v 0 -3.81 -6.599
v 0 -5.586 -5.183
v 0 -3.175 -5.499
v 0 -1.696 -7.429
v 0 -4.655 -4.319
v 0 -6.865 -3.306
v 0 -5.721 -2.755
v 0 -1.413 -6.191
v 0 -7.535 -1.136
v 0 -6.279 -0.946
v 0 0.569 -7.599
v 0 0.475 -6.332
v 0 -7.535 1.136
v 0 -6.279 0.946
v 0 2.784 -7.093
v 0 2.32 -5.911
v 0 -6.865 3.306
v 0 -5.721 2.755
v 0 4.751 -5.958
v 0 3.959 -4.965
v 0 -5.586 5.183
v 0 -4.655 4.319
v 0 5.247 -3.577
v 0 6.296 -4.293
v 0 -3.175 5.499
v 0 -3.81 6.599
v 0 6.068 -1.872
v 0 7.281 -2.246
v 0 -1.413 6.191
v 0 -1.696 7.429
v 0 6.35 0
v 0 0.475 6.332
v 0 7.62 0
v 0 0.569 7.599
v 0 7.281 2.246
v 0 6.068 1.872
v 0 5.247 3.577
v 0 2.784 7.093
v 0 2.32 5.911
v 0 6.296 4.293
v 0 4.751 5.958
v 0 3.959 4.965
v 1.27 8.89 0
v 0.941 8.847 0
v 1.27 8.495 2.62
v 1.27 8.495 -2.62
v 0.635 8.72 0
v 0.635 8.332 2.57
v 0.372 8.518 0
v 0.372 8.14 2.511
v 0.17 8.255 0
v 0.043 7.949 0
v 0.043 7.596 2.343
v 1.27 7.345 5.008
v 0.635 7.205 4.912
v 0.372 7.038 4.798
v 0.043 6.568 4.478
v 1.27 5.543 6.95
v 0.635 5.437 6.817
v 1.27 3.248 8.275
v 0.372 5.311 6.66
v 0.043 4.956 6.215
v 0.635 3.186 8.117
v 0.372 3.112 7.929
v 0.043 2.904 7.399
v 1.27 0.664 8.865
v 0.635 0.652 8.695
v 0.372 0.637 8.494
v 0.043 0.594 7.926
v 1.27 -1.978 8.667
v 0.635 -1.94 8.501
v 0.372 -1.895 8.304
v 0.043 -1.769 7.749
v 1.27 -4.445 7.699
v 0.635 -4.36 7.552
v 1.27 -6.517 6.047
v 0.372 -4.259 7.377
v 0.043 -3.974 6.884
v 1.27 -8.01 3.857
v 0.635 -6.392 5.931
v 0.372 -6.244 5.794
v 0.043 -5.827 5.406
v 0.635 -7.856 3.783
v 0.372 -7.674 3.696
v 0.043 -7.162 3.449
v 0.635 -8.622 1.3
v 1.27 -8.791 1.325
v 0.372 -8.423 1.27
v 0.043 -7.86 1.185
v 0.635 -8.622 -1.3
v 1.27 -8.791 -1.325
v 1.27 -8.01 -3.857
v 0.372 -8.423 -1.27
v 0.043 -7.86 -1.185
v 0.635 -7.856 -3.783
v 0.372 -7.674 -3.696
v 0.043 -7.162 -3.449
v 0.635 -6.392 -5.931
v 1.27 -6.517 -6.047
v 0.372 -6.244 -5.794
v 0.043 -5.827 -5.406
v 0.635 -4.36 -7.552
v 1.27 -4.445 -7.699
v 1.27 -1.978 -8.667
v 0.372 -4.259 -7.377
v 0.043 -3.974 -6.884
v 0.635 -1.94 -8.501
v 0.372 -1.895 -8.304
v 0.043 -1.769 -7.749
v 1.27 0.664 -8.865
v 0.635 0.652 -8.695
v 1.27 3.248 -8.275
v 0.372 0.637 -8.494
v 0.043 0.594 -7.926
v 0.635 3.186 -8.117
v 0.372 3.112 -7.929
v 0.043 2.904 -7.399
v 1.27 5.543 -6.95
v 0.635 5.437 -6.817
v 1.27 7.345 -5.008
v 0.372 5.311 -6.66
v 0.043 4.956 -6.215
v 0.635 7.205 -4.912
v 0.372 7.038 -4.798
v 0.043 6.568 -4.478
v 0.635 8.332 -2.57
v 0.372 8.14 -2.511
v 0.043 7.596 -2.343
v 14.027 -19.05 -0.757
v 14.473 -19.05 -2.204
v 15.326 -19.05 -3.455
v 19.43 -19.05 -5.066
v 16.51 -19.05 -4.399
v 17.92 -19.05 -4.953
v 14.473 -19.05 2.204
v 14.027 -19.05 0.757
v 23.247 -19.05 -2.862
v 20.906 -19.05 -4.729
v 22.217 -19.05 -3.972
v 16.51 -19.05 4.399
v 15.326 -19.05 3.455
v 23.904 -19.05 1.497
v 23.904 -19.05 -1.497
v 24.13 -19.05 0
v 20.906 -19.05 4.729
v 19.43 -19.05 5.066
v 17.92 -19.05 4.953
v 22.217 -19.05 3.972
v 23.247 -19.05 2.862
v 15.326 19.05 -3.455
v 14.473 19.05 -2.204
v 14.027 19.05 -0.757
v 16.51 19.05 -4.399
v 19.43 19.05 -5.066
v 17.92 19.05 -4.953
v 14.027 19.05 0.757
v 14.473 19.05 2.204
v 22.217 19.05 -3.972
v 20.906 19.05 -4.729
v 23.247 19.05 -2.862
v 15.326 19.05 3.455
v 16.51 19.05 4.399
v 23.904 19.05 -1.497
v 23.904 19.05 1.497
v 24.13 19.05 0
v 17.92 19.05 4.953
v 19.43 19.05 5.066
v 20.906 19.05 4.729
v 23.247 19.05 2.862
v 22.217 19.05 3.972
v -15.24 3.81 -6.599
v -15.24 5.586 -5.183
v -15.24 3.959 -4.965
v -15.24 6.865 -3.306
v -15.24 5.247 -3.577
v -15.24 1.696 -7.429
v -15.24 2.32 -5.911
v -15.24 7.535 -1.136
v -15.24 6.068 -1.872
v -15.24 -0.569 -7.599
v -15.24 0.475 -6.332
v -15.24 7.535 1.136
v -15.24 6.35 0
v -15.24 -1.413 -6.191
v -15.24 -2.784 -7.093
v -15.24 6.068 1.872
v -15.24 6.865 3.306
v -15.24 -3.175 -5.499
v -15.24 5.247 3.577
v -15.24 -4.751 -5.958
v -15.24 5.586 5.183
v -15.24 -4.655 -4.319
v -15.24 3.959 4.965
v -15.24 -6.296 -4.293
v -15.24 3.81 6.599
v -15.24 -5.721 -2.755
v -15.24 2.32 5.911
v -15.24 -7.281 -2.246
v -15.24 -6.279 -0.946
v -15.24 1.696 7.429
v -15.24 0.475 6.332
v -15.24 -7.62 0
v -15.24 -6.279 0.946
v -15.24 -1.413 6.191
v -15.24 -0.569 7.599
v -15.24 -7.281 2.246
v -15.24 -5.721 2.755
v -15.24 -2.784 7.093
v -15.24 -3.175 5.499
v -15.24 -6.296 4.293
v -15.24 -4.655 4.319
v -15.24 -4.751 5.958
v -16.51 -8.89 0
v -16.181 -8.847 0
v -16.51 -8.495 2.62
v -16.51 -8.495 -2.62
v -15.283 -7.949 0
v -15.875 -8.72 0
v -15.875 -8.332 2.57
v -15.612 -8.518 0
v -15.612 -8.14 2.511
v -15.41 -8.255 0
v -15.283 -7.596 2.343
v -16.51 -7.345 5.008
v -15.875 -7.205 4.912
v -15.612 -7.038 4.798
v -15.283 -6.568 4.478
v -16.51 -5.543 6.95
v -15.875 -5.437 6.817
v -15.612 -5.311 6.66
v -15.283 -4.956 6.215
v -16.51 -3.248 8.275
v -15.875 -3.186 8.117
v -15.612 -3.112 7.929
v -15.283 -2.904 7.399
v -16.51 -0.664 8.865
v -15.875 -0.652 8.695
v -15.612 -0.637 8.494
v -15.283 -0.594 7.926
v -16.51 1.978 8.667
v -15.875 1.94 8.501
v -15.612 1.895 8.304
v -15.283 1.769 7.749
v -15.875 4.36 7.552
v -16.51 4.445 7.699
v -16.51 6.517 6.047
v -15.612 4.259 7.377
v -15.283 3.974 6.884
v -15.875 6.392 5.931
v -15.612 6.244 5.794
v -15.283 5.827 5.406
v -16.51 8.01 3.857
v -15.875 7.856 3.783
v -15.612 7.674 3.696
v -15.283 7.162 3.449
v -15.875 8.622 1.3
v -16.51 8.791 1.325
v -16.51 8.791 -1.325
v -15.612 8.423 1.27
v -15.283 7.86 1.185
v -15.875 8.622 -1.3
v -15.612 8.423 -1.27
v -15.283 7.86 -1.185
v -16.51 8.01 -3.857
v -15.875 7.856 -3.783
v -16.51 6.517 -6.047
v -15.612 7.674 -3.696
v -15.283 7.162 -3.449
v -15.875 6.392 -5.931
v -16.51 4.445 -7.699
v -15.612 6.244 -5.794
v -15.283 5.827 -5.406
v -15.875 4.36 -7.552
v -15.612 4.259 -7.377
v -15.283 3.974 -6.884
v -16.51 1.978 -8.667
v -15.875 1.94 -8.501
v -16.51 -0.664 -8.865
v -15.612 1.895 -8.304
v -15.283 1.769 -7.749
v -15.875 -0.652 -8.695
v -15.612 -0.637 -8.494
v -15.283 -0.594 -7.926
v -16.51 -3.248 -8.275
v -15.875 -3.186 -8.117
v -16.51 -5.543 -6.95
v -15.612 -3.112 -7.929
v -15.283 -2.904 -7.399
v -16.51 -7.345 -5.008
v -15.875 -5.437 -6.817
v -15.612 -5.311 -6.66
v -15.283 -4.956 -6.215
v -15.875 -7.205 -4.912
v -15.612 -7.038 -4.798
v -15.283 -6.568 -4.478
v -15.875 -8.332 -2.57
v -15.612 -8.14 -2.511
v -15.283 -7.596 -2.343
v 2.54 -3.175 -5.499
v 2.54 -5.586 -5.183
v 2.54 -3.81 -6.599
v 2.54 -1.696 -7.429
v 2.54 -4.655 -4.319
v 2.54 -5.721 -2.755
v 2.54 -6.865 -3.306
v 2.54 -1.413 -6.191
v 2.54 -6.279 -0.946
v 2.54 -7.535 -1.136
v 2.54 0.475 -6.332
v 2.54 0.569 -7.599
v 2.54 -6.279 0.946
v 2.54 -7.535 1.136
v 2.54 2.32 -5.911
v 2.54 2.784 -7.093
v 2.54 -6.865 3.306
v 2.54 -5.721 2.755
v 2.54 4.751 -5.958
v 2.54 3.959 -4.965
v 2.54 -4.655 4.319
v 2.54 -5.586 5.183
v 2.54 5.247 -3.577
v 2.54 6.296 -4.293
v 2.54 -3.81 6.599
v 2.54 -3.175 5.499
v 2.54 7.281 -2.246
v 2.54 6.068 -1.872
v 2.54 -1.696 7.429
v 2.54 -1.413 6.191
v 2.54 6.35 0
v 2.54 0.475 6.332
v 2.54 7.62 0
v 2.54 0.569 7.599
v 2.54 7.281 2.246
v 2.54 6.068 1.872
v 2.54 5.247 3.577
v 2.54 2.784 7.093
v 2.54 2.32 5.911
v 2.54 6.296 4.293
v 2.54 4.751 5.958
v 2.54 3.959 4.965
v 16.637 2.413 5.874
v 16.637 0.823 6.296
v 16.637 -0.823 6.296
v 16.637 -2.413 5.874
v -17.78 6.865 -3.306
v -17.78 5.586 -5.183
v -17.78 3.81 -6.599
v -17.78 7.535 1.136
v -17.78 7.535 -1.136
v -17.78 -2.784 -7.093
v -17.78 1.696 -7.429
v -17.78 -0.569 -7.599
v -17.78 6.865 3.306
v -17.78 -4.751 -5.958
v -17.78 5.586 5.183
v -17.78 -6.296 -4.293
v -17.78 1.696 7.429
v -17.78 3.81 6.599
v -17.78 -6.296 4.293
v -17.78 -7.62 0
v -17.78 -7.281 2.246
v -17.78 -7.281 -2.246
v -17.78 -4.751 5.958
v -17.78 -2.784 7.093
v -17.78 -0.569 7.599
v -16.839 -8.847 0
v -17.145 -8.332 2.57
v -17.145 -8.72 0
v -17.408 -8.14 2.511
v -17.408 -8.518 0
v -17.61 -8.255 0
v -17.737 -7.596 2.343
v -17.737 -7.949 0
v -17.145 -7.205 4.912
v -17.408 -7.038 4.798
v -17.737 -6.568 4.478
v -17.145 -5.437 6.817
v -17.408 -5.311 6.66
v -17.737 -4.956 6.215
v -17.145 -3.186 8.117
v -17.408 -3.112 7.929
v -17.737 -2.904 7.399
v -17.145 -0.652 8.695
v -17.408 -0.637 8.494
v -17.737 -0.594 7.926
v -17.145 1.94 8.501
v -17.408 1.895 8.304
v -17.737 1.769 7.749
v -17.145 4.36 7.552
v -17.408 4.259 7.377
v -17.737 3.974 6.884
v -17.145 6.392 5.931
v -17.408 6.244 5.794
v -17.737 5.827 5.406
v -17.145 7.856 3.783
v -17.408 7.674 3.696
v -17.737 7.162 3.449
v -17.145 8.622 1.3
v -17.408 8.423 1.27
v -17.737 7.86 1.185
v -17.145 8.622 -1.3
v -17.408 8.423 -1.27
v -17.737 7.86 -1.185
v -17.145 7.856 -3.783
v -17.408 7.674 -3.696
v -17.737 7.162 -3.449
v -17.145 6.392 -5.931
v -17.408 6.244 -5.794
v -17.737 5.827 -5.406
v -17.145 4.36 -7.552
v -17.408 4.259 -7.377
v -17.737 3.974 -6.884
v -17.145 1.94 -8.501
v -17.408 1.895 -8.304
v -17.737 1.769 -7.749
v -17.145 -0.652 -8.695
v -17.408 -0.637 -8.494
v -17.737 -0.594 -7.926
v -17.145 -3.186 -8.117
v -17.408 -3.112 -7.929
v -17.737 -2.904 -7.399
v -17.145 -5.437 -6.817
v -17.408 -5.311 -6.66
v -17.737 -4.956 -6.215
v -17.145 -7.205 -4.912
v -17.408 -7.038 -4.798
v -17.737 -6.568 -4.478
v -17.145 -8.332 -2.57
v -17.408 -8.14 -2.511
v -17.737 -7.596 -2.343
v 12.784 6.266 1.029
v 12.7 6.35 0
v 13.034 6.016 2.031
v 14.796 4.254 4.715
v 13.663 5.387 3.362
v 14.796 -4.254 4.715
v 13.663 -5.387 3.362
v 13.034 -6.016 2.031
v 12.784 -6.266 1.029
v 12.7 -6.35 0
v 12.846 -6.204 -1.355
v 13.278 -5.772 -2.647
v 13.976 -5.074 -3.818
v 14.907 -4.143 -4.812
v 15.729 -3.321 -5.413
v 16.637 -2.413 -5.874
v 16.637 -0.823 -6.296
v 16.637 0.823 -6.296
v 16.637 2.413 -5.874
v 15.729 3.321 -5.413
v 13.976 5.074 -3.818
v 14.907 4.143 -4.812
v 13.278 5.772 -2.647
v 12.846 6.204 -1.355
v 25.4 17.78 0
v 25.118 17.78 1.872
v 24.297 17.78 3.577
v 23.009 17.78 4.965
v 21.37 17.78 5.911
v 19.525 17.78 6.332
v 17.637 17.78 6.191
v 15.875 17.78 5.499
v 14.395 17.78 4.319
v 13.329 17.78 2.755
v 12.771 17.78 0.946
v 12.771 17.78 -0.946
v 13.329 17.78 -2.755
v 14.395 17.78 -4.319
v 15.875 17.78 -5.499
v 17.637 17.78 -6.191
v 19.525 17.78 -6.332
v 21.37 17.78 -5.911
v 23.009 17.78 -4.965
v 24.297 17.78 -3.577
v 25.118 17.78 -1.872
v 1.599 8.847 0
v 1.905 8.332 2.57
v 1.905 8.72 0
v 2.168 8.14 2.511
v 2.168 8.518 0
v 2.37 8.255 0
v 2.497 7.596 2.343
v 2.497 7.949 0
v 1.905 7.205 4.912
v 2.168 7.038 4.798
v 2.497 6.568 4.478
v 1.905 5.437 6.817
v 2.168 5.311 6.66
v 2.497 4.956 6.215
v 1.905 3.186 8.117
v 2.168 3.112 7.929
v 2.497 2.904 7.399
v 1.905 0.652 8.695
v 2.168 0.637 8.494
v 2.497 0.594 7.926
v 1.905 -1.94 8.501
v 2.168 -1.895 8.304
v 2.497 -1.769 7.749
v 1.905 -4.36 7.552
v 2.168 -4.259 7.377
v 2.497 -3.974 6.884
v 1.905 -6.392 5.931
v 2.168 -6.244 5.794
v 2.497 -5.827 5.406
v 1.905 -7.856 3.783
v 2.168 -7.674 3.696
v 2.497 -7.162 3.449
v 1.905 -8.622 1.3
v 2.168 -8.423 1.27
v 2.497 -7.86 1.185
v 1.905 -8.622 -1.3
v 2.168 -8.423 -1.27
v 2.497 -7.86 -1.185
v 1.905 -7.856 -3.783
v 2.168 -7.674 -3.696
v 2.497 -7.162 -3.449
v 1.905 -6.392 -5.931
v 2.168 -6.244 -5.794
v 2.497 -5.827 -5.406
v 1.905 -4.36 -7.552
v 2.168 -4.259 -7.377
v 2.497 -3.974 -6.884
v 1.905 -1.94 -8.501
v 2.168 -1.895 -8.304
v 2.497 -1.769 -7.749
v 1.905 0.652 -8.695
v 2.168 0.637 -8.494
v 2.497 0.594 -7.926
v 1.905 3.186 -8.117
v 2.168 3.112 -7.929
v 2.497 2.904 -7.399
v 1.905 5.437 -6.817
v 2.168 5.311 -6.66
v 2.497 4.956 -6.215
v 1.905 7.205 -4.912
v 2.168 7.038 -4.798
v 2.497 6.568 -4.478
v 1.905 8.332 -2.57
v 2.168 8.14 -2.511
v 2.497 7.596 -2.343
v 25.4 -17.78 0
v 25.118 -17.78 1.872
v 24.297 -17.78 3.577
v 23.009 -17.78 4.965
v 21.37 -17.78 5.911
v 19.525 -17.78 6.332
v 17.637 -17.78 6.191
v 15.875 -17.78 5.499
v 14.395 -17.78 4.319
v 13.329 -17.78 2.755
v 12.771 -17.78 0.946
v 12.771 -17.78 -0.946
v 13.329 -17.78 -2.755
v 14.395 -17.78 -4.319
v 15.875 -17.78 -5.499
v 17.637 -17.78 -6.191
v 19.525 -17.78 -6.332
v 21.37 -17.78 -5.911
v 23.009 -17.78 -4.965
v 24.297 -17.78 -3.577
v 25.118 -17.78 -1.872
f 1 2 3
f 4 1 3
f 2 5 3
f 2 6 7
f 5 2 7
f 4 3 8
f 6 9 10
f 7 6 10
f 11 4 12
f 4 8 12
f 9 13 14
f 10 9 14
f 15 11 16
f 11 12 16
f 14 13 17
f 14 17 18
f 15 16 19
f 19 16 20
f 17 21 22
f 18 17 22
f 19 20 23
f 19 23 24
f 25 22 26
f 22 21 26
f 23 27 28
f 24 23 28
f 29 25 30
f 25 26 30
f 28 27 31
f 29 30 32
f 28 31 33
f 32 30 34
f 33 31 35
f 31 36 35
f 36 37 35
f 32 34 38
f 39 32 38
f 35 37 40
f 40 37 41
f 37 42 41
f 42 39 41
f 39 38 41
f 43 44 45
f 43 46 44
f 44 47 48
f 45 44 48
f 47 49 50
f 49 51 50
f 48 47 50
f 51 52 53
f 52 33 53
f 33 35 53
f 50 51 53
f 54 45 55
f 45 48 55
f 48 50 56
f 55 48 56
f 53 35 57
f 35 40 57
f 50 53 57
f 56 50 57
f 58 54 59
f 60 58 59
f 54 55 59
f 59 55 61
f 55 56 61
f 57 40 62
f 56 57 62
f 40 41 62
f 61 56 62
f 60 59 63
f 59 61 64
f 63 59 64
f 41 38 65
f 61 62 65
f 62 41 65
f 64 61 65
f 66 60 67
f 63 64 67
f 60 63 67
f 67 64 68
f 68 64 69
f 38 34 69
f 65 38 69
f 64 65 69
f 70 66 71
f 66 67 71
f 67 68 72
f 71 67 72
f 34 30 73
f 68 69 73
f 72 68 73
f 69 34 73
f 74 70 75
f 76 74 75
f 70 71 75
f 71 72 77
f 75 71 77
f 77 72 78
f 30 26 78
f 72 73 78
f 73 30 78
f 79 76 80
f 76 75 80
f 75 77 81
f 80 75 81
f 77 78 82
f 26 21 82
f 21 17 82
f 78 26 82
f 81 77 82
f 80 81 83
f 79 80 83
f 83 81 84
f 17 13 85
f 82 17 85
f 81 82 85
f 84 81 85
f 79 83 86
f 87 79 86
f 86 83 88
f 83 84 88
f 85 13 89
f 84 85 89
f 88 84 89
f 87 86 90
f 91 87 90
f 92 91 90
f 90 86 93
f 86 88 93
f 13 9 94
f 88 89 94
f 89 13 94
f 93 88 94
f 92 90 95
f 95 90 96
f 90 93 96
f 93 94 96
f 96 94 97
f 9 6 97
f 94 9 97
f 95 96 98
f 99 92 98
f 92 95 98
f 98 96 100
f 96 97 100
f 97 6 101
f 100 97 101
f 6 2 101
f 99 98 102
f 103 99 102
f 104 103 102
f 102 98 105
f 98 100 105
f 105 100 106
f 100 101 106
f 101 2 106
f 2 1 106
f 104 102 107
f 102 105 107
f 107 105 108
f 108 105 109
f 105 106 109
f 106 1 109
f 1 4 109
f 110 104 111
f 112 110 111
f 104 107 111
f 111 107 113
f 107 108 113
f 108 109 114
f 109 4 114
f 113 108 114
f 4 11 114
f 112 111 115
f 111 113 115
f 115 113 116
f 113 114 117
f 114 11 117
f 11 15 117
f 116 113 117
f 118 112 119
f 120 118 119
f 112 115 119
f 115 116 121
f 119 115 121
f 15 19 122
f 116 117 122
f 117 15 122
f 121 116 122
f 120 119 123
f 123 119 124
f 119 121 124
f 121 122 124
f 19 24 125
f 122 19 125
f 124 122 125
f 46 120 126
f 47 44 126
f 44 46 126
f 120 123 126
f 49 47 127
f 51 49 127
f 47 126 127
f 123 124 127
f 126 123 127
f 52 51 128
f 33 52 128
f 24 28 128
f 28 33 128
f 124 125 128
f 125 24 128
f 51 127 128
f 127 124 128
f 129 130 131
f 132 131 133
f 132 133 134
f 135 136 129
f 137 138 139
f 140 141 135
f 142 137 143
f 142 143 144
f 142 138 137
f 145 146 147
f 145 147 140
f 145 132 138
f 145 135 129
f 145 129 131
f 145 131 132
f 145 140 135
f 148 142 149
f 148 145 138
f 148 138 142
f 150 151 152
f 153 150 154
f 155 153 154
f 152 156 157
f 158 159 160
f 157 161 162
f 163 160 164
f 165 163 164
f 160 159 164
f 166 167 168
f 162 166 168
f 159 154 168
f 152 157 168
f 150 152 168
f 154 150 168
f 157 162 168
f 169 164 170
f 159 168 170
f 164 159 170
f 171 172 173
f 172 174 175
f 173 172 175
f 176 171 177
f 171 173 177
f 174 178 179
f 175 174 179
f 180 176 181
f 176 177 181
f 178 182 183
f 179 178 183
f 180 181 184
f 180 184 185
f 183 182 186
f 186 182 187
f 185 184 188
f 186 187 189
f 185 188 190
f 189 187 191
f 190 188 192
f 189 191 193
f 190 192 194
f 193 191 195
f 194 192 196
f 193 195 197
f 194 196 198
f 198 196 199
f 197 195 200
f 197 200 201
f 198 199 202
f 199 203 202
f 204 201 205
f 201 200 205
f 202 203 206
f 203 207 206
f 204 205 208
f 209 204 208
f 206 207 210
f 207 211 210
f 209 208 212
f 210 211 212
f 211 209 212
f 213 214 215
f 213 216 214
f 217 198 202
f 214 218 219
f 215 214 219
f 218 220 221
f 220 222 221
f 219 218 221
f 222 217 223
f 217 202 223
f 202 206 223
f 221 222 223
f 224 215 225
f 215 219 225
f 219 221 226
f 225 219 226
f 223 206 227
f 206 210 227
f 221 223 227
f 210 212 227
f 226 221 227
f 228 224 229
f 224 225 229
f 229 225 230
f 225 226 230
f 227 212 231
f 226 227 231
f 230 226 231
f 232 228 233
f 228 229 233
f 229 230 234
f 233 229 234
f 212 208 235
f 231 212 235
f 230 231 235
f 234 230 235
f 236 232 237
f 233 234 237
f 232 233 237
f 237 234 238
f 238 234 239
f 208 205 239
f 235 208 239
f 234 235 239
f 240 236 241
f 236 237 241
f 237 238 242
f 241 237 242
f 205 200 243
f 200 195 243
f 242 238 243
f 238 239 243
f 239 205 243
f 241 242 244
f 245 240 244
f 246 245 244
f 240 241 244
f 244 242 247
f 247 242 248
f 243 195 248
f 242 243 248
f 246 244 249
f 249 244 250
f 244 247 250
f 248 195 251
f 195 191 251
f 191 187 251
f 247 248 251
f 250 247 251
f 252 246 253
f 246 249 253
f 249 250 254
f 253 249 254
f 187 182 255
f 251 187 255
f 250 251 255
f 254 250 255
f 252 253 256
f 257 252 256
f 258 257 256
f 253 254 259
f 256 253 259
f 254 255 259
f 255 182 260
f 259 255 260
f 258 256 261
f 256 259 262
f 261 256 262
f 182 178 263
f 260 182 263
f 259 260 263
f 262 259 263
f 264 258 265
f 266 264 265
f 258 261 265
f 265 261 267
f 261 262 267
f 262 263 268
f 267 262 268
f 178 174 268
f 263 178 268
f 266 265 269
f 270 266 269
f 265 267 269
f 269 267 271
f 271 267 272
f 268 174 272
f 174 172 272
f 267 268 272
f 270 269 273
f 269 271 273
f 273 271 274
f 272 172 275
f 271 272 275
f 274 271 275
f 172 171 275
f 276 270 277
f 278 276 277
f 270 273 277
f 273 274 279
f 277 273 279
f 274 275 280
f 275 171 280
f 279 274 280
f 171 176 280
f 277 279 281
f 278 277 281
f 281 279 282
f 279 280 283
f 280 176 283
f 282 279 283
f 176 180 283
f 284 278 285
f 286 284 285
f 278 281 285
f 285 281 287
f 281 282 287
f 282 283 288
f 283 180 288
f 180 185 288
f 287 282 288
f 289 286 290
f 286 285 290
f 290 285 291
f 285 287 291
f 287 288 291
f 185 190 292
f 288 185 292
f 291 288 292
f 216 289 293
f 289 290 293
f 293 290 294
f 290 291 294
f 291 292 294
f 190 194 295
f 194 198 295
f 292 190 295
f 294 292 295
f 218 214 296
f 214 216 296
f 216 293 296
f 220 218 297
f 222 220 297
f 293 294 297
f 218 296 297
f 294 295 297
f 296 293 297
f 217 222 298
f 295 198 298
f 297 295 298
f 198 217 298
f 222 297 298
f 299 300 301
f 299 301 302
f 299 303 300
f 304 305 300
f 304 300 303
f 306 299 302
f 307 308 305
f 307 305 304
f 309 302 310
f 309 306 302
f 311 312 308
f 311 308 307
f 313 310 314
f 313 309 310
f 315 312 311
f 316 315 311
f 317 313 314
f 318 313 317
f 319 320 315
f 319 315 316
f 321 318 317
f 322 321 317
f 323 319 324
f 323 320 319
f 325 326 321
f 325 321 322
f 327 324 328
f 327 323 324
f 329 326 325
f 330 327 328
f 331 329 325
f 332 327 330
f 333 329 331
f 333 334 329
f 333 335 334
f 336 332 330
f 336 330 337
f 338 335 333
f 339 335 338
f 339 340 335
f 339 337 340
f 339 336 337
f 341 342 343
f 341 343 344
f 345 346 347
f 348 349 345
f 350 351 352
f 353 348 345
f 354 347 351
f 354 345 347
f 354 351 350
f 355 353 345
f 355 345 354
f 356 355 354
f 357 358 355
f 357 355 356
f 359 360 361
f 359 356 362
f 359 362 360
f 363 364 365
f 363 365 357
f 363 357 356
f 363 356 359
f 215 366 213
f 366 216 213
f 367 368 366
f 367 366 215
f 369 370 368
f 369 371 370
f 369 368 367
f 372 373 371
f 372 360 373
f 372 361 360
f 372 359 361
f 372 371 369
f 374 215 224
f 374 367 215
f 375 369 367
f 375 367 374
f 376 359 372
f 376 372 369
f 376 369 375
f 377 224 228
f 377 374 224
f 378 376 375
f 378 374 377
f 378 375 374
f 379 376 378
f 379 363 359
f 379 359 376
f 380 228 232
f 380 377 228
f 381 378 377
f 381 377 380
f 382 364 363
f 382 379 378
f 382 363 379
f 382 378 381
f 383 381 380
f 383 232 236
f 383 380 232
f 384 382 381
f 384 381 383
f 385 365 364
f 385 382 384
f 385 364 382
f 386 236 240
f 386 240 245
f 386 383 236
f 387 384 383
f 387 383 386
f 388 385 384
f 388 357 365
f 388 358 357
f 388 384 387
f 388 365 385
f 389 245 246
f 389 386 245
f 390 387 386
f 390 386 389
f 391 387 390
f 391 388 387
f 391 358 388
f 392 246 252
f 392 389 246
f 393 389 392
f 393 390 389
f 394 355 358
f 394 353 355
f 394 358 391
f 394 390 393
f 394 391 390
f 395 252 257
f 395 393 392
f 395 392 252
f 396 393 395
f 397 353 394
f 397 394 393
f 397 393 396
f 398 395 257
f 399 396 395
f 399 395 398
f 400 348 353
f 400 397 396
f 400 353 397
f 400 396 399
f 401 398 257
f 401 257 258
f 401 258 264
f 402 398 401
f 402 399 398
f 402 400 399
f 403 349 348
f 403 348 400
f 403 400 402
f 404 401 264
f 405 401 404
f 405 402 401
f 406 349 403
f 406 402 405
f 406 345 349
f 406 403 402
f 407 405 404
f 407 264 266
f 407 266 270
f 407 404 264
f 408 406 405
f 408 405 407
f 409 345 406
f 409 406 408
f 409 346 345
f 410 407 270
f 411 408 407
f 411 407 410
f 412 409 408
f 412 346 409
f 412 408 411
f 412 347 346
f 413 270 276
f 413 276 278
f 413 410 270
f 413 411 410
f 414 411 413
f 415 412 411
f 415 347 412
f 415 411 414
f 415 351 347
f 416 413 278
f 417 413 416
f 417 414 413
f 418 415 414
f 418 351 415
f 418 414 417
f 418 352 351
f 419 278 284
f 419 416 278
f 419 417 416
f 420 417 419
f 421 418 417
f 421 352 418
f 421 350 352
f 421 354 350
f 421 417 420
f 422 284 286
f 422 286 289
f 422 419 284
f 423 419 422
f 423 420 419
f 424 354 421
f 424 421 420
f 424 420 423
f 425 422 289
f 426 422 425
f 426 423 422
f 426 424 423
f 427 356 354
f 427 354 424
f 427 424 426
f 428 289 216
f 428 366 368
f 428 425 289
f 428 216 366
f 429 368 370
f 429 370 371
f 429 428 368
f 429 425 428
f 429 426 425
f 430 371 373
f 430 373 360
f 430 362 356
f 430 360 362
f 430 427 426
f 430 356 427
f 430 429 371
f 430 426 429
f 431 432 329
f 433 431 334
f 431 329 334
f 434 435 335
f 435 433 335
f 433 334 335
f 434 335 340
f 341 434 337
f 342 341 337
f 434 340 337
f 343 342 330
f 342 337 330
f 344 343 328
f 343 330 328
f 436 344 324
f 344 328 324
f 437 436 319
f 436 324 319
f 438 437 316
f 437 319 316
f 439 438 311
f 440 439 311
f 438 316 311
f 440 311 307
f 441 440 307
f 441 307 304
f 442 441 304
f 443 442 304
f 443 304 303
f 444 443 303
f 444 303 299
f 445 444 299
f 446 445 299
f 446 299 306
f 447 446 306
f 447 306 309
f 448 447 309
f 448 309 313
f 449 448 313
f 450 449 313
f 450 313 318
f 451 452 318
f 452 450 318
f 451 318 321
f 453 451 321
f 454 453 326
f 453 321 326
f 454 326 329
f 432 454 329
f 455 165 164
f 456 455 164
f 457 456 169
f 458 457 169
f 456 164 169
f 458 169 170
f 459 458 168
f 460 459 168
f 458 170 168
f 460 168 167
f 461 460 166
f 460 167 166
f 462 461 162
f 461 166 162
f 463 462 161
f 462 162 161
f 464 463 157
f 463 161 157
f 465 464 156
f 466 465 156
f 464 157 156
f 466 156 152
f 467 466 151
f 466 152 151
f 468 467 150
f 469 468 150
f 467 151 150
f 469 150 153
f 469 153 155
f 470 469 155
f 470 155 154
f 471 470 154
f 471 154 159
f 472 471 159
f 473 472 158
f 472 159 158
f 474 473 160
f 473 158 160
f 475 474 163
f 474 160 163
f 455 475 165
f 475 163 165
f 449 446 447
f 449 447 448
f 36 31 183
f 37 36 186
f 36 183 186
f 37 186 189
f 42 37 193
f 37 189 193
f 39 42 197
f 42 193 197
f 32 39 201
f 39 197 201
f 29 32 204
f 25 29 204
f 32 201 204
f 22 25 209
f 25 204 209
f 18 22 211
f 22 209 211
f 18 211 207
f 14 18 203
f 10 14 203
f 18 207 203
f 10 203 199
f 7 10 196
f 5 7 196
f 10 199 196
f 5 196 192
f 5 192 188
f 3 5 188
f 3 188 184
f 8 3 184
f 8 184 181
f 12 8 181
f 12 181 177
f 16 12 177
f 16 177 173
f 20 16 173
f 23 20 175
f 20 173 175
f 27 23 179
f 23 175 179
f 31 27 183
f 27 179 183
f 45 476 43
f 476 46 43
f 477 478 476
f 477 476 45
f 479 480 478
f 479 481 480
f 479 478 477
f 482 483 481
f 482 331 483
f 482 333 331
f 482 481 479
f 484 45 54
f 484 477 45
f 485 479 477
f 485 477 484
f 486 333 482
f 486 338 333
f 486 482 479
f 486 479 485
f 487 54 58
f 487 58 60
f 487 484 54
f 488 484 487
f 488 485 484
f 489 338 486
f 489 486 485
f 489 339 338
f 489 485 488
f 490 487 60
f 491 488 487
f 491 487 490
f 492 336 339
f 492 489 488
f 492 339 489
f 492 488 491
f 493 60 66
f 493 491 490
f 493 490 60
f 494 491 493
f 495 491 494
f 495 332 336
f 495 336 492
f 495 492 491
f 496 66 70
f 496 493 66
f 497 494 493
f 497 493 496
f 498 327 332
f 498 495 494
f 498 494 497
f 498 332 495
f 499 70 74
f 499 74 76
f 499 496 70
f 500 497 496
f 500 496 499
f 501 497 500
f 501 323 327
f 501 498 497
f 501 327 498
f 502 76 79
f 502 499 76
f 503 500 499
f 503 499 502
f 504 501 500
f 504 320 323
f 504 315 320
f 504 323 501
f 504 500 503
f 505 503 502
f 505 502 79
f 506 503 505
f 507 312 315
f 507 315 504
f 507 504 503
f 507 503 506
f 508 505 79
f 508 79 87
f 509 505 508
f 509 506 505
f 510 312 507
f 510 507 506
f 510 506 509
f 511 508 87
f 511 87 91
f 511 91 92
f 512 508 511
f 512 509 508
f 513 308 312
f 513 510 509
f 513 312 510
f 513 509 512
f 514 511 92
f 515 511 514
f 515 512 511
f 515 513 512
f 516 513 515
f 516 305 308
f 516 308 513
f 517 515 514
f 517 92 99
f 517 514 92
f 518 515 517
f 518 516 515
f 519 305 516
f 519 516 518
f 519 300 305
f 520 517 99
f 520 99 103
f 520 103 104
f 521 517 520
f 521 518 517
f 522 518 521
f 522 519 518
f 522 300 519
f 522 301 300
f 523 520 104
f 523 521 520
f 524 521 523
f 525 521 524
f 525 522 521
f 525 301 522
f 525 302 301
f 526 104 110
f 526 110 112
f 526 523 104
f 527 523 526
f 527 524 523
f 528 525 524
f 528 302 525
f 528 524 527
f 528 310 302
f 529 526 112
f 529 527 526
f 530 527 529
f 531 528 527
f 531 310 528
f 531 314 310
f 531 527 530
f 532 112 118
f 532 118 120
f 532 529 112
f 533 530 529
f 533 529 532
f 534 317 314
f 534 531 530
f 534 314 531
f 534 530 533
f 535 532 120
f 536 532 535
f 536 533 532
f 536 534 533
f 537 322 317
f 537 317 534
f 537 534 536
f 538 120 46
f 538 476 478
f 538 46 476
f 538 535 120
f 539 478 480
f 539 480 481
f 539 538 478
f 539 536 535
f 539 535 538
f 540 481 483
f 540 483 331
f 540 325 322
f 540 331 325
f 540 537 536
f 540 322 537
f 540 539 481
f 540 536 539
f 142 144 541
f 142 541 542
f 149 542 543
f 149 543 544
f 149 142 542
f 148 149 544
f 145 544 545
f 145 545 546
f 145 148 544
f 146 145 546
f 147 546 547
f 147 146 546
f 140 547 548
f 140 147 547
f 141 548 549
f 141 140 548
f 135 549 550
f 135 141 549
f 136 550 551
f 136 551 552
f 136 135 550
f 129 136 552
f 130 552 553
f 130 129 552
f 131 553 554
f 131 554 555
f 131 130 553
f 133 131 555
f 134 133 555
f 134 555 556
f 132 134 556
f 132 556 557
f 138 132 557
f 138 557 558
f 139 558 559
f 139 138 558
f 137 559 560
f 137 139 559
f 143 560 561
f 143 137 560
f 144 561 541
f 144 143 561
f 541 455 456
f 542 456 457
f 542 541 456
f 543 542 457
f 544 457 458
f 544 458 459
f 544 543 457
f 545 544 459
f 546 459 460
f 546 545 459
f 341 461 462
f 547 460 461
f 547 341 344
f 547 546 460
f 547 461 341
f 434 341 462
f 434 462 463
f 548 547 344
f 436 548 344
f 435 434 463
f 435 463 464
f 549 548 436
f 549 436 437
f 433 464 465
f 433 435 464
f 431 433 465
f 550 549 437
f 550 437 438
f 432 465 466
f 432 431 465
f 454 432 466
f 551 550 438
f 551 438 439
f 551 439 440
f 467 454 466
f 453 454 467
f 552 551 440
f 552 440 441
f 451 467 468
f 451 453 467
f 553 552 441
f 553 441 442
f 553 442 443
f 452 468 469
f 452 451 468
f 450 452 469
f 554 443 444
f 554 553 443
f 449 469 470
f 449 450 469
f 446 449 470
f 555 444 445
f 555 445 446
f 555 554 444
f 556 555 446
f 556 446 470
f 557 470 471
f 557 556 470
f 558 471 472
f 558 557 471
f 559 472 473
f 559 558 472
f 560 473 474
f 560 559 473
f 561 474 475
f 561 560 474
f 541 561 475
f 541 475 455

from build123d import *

# Parameters (mm, degrees)
F0_R      = 6.35
F1_DEPTH  = 15.24
F2_R      = 8.89
F3_DEPTH  = 2.54
F4_R      = 1.26999
F5_R      = 8.89
F6_DEPTH  = 2.54
F7_R      = 1.26999
F8_R      = 6.35
F9_DEPTH  = 19.05
F10_R     = 6.35
F11_DEPTH = 14.097
F12_SIZE  = 1.27


# Not quite as in the source:
# - a fillet or chamfer is up to 0.001 mm smaller than in the source, because OpenCascade refuses the exact size


with BuildPart() as f1:
    # F0 (on Right) → F1 (new body)
    with BuildSketch(Plane.YZ):
        with Locations((0, 182.4067449291)):
            Circle(F0_R)
    extrude(amount=F1_DEPTH)

    # F2 (on face) → F3 (join)
    with BuildSketch(Plane(origin=(0, 0, 0), x_dir=(0, -1, 0), z_dir=(-1, 0, 0))):
        with Locations((0, 182.4067449291)):
            Circle(F2_R)
    extrude(amount=F3_DEPTH)

    # F4 (radius 1.27 in the source; OpenCascade refuses exactly that, so slightly less here)
    f4_edges = [f1.edges().sort_by_distance(p)[0] for p in [
        (-1.27, -8.89, 182.406745),
        (0, 8.89, 182.406745),
        (-2.54, 8.89, 182.406745),
    ]]
    fillet(f4_edges, radius=F4_R)

    # F5 (on face) → F6 (join)
    with BuildSketch(Plane.YZ.offset(15.24)):
        with Locations((0, 182.4067449291)):
            Circle(F5_R)
    extrude(amount=F6_DEPTH)

    # F7 (radius 1.27 in the source; OpenCascade refuses exactly that, so slightly less here)
    f7_edges = [f1.edges().sort_by_distance(p)[0] for p in [
        (16.51, 8.89, 182.406745),
        (15.24, -8.89, 182.406745),
        (17.78, -8.89, 182.406745),
    ]]
    fillet(f7_edges, radius=F7_R)



with BuildPart() as f9:
    # F8 (on Front) → F9 (new body, symmetric)
    with BuildSketch(Plane.XZ):
        with Locations((34.29, 182.4067449291)):
            Circle(F8_R)
    extrude(amount=F9_DEPTH, both=True)


with BuildPart() as f1_1:
    add(f1.part)

    add(f9.part)  # F11 merges F9
    # F10 (on face) → F11 (join)
    with BuildSketch(Plane.YZ.offset(17.78)):
        with Locations((0, 182.4067449291)):
            Circle(F10_R)
    extrude(amount=F11_DEPTH)

    # F12
    f12_edges = [f1_1.edges().sort_by_distance(p)[0] for p in [
        (27.94, -19.05, 182.406745),
        (27.94, 19.05, 182.406745),
    ]]
    chamfer(f12_edges, length=F12_SIZE)


with BuildPart() as f1_2:
    # F14: moved
    add(f1_1.part.moved(Location((-15.24, 0, -182.4067449291))))


solid = f1_2.part
